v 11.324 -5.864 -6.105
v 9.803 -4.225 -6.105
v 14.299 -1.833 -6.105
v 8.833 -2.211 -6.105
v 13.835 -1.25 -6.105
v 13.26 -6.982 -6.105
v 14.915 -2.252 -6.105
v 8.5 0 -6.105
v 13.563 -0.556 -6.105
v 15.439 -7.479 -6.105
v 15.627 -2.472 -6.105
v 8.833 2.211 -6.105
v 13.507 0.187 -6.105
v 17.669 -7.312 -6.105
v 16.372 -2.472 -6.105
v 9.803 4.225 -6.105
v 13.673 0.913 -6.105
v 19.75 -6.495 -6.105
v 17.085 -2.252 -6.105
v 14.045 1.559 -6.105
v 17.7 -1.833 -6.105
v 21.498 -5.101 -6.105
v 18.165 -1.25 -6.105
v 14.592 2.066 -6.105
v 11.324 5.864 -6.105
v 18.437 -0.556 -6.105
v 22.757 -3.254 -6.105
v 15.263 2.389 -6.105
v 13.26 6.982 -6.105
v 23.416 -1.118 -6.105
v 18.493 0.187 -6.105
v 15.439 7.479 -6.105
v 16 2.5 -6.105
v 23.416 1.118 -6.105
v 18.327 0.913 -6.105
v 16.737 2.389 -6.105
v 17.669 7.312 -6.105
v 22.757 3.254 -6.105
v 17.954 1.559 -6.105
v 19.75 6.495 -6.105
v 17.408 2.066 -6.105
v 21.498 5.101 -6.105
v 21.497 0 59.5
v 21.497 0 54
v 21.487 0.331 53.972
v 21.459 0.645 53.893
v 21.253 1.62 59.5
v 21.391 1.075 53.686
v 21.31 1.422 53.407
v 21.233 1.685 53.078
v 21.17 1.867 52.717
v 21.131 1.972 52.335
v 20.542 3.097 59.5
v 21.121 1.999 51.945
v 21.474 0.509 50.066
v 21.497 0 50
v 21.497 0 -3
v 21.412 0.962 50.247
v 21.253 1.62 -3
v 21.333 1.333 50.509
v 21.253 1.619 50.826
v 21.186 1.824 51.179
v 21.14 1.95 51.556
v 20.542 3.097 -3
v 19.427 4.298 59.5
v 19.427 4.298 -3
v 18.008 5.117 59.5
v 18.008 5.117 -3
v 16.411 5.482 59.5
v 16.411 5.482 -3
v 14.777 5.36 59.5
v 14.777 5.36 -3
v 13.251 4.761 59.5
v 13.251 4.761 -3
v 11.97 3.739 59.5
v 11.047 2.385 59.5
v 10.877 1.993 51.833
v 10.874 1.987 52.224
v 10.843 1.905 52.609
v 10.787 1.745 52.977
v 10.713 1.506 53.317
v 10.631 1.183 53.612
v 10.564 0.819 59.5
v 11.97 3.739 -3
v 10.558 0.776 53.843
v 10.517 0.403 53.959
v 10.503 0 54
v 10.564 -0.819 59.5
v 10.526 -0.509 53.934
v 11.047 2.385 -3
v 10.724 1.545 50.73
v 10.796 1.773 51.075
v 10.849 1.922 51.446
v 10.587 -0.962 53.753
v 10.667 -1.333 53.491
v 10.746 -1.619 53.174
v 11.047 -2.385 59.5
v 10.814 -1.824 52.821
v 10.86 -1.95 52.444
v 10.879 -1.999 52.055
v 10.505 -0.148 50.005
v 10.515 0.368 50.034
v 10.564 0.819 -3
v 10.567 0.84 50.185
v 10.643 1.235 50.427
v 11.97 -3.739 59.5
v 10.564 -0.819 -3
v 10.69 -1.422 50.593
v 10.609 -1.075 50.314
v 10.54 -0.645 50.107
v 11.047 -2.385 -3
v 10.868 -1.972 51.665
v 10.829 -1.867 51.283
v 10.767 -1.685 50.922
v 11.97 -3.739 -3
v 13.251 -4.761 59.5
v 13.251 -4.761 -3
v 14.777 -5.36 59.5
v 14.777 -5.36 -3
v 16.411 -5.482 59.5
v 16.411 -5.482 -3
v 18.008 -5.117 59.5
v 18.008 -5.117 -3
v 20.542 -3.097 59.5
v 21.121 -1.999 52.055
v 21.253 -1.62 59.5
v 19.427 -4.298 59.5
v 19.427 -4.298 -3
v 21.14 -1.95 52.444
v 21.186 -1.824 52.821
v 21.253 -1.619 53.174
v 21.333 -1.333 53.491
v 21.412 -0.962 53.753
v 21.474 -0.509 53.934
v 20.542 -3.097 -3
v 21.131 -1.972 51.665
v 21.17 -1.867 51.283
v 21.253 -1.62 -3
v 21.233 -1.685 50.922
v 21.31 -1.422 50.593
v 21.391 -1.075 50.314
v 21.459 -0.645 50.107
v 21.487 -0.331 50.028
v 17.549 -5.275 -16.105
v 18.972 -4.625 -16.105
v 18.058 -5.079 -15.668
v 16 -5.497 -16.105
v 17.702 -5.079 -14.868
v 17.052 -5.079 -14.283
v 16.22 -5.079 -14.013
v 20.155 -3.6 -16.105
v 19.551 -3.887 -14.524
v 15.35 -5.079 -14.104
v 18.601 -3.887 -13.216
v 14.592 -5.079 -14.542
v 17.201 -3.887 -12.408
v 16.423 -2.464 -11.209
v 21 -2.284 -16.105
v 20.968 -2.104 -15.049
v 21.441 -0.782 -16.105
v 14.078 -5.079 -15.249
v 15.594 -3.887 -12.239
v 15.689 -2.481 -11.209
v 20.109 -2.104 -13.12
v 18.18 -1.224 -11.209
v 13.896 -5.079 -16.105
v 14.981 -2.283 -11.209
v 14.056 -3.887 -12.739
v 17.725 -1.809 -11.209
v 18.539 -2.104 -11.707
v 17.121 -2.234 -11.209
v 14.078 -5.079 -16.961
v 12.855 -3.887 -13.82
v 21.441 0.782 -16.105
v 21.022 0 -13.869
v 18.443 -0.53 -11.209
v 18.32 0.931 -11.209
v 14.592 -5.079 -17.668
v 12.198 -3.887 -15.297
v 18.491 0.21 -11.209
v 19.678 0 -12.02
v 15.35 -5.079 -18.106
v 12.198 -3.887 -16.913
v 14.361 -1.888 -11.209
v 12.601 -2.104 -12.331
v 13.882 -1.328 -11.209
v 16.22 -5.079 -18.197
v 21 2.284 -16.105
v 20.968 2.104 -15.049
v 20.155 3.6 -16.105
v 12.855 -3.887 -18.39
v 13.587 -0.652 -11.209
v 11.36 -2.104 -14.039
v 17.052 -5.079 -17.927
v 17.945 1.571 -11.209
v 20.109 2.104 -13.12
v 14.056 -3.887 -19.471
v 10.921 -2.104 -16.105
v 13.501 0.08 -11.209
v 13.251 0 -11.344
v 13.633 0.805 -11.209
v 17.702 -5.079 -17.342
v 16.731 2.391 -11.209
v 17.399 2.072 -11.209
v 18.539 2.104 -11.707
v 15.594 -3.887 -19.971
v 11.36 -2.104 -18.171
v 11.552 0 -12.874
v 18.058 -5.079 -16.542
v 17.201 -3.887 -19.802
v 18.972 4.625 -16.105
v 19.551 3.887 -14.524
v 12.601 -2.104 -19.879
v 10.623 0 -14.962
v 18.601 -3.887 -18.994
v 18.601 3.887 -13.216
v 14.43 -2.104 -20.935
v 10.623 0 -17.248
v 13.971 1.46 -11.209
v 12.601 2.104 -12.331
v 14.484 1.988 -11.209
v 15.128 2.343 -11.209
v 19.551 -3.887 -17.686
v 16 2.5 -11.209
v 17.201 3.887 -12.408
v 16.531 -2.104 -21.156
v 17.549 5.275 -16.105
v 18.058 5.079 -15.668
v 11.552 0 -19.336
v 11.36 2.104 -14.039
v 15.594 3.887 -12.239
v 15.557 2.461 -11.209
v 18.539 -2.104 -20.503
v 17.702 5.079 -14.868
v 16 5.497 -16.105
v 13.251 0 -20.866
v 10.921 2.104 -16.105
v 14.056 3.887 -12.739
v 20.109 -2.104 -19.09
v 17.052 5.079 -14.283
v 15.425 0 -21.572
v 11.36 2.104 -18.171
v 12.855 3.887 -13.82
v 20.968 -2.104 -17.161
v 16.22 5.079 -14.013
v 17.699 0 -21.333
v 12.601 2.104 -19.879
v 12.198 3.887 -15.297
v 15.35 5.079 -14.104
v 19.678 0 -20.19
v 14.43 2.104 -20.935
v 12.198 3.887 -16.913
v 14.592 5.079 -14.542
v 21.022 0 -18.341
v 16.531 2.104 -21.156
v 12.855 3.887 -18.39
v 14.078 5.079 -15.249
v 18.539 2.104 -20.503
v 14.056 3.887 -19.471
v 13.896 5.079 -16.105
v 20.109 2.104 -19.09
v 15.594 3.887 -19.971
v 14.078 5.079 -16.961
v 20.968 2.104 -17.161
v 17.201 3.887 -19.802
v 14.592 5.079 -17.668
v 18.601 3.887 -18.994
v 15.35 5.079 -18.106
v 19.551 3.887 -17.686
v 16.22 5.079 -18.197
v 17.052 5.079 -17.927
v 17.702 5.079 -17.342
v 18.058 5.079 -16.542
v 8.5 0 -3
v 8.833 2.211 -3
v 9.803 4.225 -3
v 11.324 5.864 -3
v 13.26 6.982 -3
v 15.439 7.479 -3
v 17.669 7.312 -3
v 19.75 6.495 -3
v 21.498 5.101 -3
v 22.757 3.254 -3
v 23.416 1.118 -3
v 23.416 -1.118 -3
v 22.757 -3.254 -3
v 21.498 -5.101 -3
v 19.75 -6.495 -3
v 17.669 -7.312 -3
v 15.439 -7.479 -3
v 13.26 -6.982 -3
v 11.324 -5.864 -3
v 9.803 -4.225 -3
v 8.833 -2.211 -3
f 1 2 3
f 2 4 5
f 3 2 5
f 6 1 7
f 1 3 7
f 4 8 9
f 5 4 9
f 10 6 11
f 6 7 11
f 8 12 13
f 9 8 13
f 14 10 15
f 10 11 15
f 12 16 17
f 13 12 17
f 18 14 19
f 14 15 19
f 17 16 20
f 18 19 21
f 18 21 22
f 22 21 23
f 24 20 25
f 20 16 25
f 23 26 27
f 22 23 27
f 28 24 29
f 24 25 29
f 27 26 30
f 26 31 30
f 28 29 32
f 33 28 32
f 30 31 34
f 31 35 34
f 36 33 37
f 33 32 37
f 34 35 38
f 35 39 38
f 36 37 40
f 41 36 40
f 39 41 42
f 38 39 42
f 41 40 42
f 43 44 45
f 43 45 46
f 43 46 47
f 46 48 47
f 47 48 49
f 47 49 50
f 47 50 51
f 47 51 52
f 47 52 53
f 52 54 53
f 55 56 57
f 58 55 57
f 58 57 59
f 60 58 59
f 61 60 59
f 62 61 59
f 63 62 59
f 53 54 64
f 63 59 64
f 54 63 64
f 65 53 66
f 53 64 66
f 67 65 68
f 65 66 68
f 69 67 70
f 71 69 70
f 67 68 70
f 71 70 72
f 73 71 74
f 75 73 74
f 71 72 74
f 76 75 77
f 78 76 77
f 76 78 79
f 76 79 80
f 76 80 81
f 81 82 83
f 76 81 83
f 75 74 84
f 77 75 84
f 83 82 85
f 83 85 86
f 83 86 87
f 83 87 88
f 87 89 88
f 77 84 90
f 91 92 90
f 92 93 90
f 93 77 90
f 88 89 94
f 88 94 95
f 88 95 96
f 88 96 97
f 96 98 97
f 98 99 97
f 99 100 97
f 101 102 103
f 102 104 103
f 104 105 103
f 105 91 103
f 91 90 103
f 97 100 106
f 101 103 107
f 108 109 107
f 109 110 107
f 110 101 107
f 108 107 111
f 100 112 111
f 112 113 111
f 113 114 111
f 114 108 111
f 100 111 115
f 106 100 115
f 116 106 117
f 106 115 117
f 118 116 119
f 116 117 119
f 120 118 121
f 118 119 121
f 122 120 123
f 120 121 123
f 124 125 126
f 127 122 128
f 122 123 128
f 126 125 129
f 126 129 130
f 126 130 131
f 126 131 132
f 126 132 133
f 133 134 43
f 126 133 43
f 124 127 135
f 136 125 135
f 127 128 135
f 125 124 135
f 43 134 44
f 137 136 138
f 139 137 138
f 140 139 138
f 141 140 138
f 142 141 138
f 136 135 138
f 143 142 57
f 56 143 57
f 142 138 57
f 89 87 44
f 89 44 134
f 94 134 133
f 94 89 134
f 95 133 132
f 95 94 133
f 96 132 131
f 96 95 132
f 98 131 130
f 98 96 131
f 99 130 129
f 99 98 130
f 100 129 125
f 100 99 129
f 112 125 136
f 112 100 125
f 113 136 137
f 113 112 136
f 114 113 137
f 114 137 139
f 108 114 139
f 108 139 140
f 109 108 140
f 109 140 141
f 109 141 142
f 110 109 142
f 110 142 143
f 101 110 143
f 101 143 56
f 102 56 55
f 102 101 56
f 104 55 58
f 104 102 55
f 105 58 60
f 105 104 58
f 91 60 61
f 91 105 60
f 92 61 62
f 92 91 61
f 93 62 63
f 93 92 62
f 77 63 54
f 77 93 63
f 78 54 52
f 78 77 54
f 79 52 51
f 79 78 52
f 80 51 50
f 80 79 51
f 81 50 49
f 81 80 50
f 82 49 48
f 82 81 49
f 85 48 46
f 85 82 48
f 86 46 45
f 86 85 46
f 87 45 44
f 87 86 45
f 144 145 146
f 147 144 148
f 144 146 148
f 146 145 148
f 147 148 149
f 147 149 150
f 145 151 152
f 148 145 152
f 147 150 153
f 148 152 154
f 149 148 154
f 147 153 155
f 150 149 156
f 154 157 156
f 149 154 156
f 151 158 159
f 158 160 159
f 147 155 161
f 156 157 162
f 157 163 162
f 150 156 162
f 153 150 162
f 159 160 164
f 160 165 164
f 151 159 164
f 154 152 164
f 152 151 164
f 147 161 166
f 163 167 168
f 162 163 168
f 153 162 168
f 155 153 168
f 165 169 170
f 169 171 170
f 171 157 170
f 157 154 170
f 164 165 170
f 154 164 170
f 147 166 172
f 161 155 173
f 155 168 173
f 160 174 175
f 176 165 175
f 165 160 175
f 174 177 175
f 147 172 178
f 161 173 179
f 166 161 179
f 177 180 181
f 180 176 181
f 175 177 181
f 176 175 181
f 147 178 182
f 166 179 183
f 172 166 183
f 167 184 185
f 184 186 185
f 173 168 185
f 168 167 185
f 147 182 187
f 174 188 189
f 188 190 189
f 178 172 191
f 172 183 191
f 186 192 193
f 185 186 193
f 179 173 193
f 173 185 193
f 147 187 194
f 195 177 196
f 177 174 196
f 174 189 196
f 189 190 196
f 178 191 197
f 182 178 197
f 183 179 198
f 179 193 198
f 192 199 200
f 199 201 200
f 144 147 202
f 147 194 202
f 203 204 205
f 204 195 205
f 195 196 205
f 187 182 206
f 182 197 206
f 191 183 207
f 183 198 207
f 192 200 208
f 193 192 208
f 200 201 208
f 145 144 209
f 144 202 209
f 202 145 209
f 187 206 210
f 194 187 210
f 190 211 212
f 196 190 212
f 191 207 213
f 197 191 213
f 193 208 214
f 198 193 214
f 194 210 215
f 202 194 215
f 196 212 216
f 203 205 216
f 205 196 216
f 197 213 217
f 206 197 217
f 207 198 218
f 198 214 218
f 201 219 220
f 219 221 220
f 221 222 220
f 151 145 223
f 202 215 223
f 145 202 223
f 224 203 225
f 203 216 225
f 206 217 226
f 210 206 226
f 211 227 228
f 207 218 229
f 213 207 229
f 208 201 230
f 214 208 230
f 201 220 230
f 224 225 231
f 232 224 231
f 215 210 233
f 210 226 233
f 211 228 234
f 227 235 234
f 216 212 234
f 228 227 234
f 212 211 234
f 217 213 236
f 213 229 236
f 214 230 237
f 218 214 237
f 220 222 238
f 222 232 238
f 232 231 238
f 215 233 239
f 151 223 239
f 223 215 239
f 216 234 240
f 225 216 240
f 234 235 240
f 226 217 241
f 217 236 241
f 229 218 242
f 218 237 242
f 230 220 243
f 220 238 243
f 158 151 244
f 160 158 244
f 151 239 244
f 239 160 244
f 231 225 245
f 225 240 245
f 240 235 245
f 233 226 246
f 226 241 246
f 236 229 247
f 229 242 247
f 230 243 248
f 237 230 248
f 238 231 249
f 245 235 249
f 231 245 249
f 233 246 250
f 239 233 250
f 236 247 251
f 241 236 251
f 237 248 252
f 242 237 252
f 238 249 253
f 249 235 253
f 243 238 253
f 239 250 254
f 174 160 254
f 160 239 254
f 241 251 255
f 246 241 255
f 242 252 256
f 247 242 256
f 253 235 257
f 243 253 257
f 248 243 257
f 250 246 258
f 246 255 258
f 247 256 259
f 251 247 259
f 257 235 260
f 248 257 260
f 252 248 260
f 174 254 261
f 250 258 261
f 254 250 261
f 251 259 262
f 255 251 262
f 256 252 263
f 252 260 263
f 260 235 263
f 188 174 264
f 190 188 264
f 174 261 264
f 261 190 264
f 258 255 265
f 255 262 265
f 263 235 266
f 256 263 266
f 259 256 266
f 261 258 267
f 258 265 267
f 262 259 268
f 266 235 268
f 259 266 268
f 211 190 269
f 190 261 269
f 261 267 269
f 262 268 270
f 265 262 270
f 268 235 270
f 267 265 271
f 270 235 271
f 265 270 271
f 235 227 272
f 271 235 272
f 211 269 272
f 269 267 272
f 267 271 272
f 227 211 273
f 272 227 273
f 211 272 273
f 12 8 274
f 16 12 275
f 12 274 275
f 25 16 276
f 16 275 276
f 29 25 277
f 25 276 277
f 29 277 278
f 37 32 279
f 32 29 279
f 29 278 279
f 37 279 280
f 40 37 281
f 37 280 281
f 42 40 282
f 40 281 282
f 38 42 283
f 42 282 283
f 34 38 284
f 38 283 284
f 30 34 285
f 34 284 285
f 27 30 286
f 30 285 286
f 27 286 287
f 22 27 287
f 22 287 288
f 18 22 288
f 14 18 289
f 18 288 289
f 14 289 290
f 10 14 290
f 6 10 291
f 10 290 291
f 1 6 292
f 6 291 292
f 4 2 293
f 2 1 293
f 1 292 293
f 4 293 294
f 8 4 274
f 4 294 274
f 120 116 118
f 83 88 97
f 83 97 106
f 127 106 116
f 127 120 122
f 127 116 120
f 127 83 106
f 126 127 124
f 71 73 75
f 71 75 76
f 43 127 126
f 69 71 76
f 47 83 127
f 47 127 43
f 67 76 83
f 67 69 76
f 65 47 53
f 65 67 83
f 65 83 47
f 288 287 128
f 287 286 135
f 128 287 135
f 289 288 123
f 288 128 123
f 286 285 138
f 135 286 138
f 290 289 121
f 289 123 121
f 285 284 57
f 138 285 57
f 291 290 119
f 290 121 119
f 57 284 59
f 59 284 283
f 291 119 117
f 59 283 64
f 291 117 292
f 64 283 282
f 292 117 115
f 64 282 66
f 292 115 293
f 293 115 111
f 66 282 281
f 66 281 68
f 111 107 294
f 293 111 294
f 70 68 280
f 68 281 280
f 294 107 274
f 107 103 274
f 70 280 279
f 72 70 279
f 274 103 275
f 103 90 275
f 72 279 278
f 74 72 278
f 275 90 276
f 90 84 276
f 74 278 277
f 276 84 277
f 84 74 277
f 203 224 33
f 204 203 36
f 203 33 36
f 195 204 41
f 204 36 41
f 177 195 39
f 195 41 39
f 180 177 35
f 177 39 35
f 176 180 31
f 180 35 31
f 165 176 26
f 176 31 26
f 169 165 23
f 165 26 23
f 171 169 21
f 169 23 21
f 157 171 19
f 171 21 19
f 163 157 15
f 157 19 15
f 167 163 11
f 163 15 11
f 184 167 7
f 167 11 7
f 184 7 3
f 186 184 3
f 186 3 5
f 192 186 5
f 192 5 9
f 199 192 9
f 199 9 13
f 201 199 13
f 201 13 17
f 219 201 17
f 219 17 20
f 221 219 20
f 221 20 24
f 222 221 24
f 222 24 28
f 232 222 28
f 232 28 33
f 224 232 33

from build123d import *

# Parameters (mm, degrees)
RESSALTO_EXTRUS_O1_DEPTH      = 60
RESSALTO_EXTRUS_O1_DEPTH_BACK = 15
ESBO_O1_R                     = 5.497341607
CORTE_EXTRUS_O1_DEPTH         = 71
CORTE_EXTRUS_O1_DEPTH_BACK    = 71
ESBO_O2_R                     = 4
CORTE_EXTRUS_O3_DEPTH         = 64.97149057
CORTE_EXTRUS_O3_DEPTH_BACK    = 64.97149057
ESBO_O8_R                     = 2
RESSALTO_EXTRUS_O5_START      = -12
ESBO_O9_R                     = 7.5
RESSALTO_EXTRUS_O5_DEPTH      = 4
CORTE_EXTRUS_O5_DEPTH         = 65.872911801
ESBO_O12_R                    = 5.497341607
RESSALTO_EXTRUS_O6_DEPTH      = 3.5
ESBO_O14_R                    = 5.497341607
RESSALTO_EXTRUS_O7_DEPTH      = 6
CORTE_EXTRUS_O7_DEPTH         = 65.410749766
CORTE_EXTRUS_O7_DEPTH_BACK    = 65.410749766
ESBO_O16_R                    = 2
CORTE_EXTRUS_O8_DEPTH         = 65.410749766
CORTE_EXTRUS_O8_DEPTH_BACK    = 65.410749766
ESBO_O17_W                    = 10
ESBO_O17_H                    = 5.11854448
RESSALTO_EXTRUS_O8_START      = -14
RESSALTO_EXTRUS_O8_DEPTH      = 14
RESSALTO_EXTRUS_O9_START      = -1.79
RESSALTO_EXTRUS_O9_DEPTH      = 1.79
RESSALTO_EXTRUS_O10_DEPTH     = 2.21
ESBO_O21_R                    = 7.5
RESSALTO_EXTRUS_O11_DEPTH     = 3
CORTE_EXTRUS_O9_DEPTH         = 66.205232537
CORTE_EXTRUS_O9_DEPTH_BACK    = 66.205232537
ESBO_O22_W                    = 15
ESBO_O22_H                    = 25.435957471
ESBO_O23_R                    = 2.5
RESSALTO_EXTRUS_O12_DEPTH     = 10


with BuildPart() as part:
    # Esboço1 → Ressalto-extrusão1 (new, two sides: drawn at the far end of the back side and taken through both)
    with BuildSketch(Plane.XY.offset(-RESSALTO_EXTRUS_O1_DEPTH_BACK)):
        with Locations((15.99988667, 0)):
            Circle(ESBO_O1_R)
    extrude(amount=RESSALTO_EXTRUS_O1_DEPTH + RESSALTO_EXTRUS_O1_DEPTH_BACK)

    # Esboço2 → Corte-extrusão1 (cut, two sides: drawn at the far end of the back side and taken through both)
    with BuildSketch(Plane(origin=(0, 0, 0), x_dir=(0, 0, -1), z_dir=(1, 0, 0)).offset(-CORTE_EXTRUS_O1_DEPTH_BACK)):
        with Locations((-60, 0)):
            Circle(ESBO_O2_R)
    extrude(amount=CORTE_EXTRUS_O1_DEPTH + CORTE_EXTRUS_O1_DEPTH_BACK, mode=Mode.SUBTRACT)

    # Esboço8 → Corte-extrusão3 (cut, two sides: drawn at the far end of the back side and taken through both)
    with BuildSketch(Plane(origin=(0, 0, 0), x_dir=(0, 0, -1), z_dir=(1, 0, 0)).offset(-CORTE_EXTRUS_O3_DEPTH_BACK)):
        with Locations(Location((-52, 0, 0), (0, 0, 180))):
            Circle(ESBO_O8_R)
    extrude(amount=CORTE_EXTRUS_O3_DEPTH + CORTE_EXTRUS_O3_DEPTH_BACK, mode=Mode.SUBTRACT)

    # Esboço9 → Ressalto-extrusão5 (add)
    with BuildSketch(Plane(origin=(0, 0, -15), x_dir=(-1, 0, 0), z_dir=(0, 0, -1)).offset(RESSALTO_EXTRUS_O5_START)):
        with Locations((-15.99988667, 0)):
            Circle(ESBO_O9_R)
    extrude(amount=RESSALTO_EXTRUS_O5_DEPTH)

    # Esboço11 → Corte-extrusão5 (cut, through all)
    with BuildSketch(Plane(origin=(0, 0, 0), x_dir=(0, 0, -1), z_dir=(1, 0, 0))):
        Polygon((-56, -5.497341607), (-56, 0), (-56, 5.497341607), (-60, 5.497341607), (-60, 4), (-60, -5.497341607), align=None)
    extrude(amount=CORTE_EXTRUS_O5_DEPTH, mode=Mode.SUBTRACT)

    # Esboço12 → Ressalto-extrusão6 (add)
    with BuildSketch(Plane.XY.offset(56)):
        with Locations((15.99988667, 0)):
            Circle(ESBO_O12_R)
    extrude(amount=RESSALTO_EXTRUS_O6_DEPTH)

    # Esboço14 → Ressalto-extrusão7 (add)
    with BuildSketch(Plane(origin=(0, 0, -15), x_dir=(-1, 0, 0), z_dir=(0, 0, -1))):
        with Locations(Location((-15.99988667, 0, 0), (0, 0, 180))):
            Circle(ESBO_O14_R)
    extrude(amount=RESSALTO_EXTRUS_O7_DEPTH)

    # Esboço16 → Corte-extrusão7 (cut, two sides: drawn at the far end of the back side and taken through both)
    with BuildSketch(Plane(origin=(0, 0, 0), x_dir=(0, 0, -1), z_dir=(1, 0, 0)).offset(-CORTE_EXTRUS_O7_DEPTH_BACK)):
        with Locations((14.21, 0)):
            Circle(ESBO_O16_R)
    extrude(amount=CORTE_EXTRUS_O7_DEPTH + CORTE_EXTRUS_O7_DEPTH_BACK, mode=Mode.SUBTRACT)

    # Esboço17 → Corte-extrusão8 (cut, two sides: drawn at the far end of the back side and taken through both)
    with BuildSketch(Plane(origin=(0, 0, 0), x_dir=(0, 0, -1), z_dir=(1, 0, 0)).offset(-CORTE_EXTRUS_O8_DEPTH_BACK)):
        with Locations((14.21, -2.55927224)):
            Rectangle(ESBO_O17_W, ESBO_O17_H)
        with Locations((14.21, 2.55927224)):
            Rectangle(ESBO_O17_W, ESBO_O17_H)
    extrude(amount=CORTE_EXTRUS_O8_DEPTH + CORTE_EXTRUS_O8_DEPTH_BACK, mode=Mode.SUBTRACT)

    # Esboço18 → Ressalto-extrusão8 (add)
    with BuildSketch(Plane(origin=(0, 0, -21), x_dir=(-1, 0, 0), z_dir=(0, 0, -1)).offset(RESSALTO_EXTRUS_O8_START)):
        with BuildLine():
            Line((-21.481720524, 5.11854448), (-18.005196408, 5.11854448))
            ThreePointArc((-18.005196408, 5.11854448), (-15.99988667, 5.497341607), (-13.994576931, 5.11854448))
            Line((-13.994576931, 5.11854448), (-10.518052815, 5.11854448))
            ThreePointArc((-10.518052815, 5.11854448), (-15.99988667, 7.5), (-21.481720524, 5.11854448))
        make_face()
        with BuildLine():
            ThreePointArc((-13.994576931, -5.11854448), (-15.99988667, -5.497341607), (-18.005196408, -5.11854448))
            Line((-18.005196408, -5.11854448), (-21.481720524, -5.11854448))
            ThreePointArc((-21.481720524, -5.11854448), (-15.99988667, -7.5), (-10.518052815, -5.11854448))
            Line((-10.518052815, -5.11854448), (-13.994576931, -5.11854448))
        make_face()
    extrude(amount=RESSALTO_EXTRUS_O8_DEPTH)

    # Esboço19 → Ressalto-extrusão9 (add)
    with BuildSketch(Plane(origin=(0, 0, -21), x_dir=(-1, 0, 0), z_dir=(0, 0, -1)).offset(RESSALTO_EXTRUS_O9_START)):
        with BuildLine():
            ThreePointArc((-21.481720524, 5.11854448), (-23.49988667, 0), (-21.481720524, -5.11854448))
            Line((-21.481720524, -5.11854448), (-18.005196408, -5.11854448))
            ThreePointArc((-18.005196408, -5.11854448), (-21.497228276, 0), (-18.005196408, 5.11854448))
            Line((-18.005196408, 5.11854448), (-21.481720524, 5.11854448))
        make_face()
        with BuildLine():
            ThreePointArc((-10.518052815, -5.11854448), (-8.49988667, 0), (-10.518052815, 5.11854448))
            Line((-10.518052815, 5.11854448), (-13.994576931, 5.11854448))
            ThreePointArc((-13.994576931, 5.11854448), (-10.502545063, 0), (-13.994576931, -5.11854448))
            Line((-13.994576931, -5.11854448), (-10.518052815, -5.11854448))
        make_face()
    extrude(amount=RESSALTO_EXTRUS_O9_DEPTH)

    # Esboço20 → Ressalto-extrusão10 (add)
    with BuildSketch(Plane(origin=(0, 0, -7), x_dir=(-1, 0, 0), z_dir=(0, 0, -1))):
        with BuildLine():
            Line((-10.518052815, 5.11854448), (-13.994576931, 5.11854448))
            ThreePointArc((-13.994576931, 5.11854448), (-10.502545063, 0), (-13.994576931, -5.11854448))
            Line((-13.994576931, -5.11854448), (-10.518052815, -5.11854448))
            ThreePointArc((-10.518052815, -5.11854448), (-8.49988667, 0), (-10.518052815, 5.11854448))
        make_face()
        with BuildLine():
            Line((-18.005196408, 5.11854448), (-21.481720524, 5.11854448))
            ThreePointArc((-21.481720524, 5.11854448), (-23.49988667, 0), (-21.481720524, -5.11854448))
            Line((-21.481720524, -5.11854448), (-18.005196408, -5.11854448))
            ThreePointArc((-18.005196408, -5.11854448), (-21.497228276, 0), (-18.005196408, 5.11854448))
        make_face()
    extrude(amount=RESSALTO_EXTRUS_O10_DEPTH)

    # Esboço21 → Ressalto-extrusão11 (add)
    with BuildSketch(Plane(origin=(0, 0, -21), x_dir=(-1, 0, 0), z_dir=(0, 0, -1))):
        with Locations((-15.99988667, 0)):
            Circle(ESBO_O21_R)
    extrude(amount=RESSALTO_EXTRUS_O11_DEPTH)

    # Esboço22 → Corte-extrusão9 (cut, two sides: drawn at the far end of the back side and taken through both)
    with BuildSketch(Plane.XZ.offset(-5.11854448).offset(-CORTE_EXTRUS_O9_DEPTH_BACK)):
        with Locations((15.99988667, -18.822978736)):
            Rectangle(ESBO_O22_W, ESBO_O22_H)
    extrude(amount=CORTE_EXTRUS_O9_DEPTH + CORTE_EXTRUS_O9_DEPTH_BACK, mode=Mode.SUBTRACT)

    # Esboço23 → Ressalto-extrusão12 (add)
    with BuildSketch(Plane(origin=(0, 0, -6.105), x_dir=(-1, 0, 0), z_dir=(0, 0, -1))):
        with Locations(Location((-15.99988667, 0, 0), (0, 0, 90))):
            Circle(ESBO_O23_R)
    extrude(amount=RESSALTO_EXTRUS_O12_DEPTH)

    # Esboço24 → Revolução1 (revolve)
    with BuildSketch(Plane(origin=(0, 0, -16.105), x_dir=(-1, 0, 0), z_dir=(0, 0, -1))):
        with BuildLine():
            Line((-15.99988667, 5.497341607), (-15.99988667, -5.497341607))
            ThreePointArc((-15.99988667, -5.497341607), (-21.497228276, 0), (-15.99988667, 5.497341607))
        make_face()
    revolve(axis=Axis((15.99988667, 5.497341607, -16.105), (0, -1, 0)))


solid = part.part
